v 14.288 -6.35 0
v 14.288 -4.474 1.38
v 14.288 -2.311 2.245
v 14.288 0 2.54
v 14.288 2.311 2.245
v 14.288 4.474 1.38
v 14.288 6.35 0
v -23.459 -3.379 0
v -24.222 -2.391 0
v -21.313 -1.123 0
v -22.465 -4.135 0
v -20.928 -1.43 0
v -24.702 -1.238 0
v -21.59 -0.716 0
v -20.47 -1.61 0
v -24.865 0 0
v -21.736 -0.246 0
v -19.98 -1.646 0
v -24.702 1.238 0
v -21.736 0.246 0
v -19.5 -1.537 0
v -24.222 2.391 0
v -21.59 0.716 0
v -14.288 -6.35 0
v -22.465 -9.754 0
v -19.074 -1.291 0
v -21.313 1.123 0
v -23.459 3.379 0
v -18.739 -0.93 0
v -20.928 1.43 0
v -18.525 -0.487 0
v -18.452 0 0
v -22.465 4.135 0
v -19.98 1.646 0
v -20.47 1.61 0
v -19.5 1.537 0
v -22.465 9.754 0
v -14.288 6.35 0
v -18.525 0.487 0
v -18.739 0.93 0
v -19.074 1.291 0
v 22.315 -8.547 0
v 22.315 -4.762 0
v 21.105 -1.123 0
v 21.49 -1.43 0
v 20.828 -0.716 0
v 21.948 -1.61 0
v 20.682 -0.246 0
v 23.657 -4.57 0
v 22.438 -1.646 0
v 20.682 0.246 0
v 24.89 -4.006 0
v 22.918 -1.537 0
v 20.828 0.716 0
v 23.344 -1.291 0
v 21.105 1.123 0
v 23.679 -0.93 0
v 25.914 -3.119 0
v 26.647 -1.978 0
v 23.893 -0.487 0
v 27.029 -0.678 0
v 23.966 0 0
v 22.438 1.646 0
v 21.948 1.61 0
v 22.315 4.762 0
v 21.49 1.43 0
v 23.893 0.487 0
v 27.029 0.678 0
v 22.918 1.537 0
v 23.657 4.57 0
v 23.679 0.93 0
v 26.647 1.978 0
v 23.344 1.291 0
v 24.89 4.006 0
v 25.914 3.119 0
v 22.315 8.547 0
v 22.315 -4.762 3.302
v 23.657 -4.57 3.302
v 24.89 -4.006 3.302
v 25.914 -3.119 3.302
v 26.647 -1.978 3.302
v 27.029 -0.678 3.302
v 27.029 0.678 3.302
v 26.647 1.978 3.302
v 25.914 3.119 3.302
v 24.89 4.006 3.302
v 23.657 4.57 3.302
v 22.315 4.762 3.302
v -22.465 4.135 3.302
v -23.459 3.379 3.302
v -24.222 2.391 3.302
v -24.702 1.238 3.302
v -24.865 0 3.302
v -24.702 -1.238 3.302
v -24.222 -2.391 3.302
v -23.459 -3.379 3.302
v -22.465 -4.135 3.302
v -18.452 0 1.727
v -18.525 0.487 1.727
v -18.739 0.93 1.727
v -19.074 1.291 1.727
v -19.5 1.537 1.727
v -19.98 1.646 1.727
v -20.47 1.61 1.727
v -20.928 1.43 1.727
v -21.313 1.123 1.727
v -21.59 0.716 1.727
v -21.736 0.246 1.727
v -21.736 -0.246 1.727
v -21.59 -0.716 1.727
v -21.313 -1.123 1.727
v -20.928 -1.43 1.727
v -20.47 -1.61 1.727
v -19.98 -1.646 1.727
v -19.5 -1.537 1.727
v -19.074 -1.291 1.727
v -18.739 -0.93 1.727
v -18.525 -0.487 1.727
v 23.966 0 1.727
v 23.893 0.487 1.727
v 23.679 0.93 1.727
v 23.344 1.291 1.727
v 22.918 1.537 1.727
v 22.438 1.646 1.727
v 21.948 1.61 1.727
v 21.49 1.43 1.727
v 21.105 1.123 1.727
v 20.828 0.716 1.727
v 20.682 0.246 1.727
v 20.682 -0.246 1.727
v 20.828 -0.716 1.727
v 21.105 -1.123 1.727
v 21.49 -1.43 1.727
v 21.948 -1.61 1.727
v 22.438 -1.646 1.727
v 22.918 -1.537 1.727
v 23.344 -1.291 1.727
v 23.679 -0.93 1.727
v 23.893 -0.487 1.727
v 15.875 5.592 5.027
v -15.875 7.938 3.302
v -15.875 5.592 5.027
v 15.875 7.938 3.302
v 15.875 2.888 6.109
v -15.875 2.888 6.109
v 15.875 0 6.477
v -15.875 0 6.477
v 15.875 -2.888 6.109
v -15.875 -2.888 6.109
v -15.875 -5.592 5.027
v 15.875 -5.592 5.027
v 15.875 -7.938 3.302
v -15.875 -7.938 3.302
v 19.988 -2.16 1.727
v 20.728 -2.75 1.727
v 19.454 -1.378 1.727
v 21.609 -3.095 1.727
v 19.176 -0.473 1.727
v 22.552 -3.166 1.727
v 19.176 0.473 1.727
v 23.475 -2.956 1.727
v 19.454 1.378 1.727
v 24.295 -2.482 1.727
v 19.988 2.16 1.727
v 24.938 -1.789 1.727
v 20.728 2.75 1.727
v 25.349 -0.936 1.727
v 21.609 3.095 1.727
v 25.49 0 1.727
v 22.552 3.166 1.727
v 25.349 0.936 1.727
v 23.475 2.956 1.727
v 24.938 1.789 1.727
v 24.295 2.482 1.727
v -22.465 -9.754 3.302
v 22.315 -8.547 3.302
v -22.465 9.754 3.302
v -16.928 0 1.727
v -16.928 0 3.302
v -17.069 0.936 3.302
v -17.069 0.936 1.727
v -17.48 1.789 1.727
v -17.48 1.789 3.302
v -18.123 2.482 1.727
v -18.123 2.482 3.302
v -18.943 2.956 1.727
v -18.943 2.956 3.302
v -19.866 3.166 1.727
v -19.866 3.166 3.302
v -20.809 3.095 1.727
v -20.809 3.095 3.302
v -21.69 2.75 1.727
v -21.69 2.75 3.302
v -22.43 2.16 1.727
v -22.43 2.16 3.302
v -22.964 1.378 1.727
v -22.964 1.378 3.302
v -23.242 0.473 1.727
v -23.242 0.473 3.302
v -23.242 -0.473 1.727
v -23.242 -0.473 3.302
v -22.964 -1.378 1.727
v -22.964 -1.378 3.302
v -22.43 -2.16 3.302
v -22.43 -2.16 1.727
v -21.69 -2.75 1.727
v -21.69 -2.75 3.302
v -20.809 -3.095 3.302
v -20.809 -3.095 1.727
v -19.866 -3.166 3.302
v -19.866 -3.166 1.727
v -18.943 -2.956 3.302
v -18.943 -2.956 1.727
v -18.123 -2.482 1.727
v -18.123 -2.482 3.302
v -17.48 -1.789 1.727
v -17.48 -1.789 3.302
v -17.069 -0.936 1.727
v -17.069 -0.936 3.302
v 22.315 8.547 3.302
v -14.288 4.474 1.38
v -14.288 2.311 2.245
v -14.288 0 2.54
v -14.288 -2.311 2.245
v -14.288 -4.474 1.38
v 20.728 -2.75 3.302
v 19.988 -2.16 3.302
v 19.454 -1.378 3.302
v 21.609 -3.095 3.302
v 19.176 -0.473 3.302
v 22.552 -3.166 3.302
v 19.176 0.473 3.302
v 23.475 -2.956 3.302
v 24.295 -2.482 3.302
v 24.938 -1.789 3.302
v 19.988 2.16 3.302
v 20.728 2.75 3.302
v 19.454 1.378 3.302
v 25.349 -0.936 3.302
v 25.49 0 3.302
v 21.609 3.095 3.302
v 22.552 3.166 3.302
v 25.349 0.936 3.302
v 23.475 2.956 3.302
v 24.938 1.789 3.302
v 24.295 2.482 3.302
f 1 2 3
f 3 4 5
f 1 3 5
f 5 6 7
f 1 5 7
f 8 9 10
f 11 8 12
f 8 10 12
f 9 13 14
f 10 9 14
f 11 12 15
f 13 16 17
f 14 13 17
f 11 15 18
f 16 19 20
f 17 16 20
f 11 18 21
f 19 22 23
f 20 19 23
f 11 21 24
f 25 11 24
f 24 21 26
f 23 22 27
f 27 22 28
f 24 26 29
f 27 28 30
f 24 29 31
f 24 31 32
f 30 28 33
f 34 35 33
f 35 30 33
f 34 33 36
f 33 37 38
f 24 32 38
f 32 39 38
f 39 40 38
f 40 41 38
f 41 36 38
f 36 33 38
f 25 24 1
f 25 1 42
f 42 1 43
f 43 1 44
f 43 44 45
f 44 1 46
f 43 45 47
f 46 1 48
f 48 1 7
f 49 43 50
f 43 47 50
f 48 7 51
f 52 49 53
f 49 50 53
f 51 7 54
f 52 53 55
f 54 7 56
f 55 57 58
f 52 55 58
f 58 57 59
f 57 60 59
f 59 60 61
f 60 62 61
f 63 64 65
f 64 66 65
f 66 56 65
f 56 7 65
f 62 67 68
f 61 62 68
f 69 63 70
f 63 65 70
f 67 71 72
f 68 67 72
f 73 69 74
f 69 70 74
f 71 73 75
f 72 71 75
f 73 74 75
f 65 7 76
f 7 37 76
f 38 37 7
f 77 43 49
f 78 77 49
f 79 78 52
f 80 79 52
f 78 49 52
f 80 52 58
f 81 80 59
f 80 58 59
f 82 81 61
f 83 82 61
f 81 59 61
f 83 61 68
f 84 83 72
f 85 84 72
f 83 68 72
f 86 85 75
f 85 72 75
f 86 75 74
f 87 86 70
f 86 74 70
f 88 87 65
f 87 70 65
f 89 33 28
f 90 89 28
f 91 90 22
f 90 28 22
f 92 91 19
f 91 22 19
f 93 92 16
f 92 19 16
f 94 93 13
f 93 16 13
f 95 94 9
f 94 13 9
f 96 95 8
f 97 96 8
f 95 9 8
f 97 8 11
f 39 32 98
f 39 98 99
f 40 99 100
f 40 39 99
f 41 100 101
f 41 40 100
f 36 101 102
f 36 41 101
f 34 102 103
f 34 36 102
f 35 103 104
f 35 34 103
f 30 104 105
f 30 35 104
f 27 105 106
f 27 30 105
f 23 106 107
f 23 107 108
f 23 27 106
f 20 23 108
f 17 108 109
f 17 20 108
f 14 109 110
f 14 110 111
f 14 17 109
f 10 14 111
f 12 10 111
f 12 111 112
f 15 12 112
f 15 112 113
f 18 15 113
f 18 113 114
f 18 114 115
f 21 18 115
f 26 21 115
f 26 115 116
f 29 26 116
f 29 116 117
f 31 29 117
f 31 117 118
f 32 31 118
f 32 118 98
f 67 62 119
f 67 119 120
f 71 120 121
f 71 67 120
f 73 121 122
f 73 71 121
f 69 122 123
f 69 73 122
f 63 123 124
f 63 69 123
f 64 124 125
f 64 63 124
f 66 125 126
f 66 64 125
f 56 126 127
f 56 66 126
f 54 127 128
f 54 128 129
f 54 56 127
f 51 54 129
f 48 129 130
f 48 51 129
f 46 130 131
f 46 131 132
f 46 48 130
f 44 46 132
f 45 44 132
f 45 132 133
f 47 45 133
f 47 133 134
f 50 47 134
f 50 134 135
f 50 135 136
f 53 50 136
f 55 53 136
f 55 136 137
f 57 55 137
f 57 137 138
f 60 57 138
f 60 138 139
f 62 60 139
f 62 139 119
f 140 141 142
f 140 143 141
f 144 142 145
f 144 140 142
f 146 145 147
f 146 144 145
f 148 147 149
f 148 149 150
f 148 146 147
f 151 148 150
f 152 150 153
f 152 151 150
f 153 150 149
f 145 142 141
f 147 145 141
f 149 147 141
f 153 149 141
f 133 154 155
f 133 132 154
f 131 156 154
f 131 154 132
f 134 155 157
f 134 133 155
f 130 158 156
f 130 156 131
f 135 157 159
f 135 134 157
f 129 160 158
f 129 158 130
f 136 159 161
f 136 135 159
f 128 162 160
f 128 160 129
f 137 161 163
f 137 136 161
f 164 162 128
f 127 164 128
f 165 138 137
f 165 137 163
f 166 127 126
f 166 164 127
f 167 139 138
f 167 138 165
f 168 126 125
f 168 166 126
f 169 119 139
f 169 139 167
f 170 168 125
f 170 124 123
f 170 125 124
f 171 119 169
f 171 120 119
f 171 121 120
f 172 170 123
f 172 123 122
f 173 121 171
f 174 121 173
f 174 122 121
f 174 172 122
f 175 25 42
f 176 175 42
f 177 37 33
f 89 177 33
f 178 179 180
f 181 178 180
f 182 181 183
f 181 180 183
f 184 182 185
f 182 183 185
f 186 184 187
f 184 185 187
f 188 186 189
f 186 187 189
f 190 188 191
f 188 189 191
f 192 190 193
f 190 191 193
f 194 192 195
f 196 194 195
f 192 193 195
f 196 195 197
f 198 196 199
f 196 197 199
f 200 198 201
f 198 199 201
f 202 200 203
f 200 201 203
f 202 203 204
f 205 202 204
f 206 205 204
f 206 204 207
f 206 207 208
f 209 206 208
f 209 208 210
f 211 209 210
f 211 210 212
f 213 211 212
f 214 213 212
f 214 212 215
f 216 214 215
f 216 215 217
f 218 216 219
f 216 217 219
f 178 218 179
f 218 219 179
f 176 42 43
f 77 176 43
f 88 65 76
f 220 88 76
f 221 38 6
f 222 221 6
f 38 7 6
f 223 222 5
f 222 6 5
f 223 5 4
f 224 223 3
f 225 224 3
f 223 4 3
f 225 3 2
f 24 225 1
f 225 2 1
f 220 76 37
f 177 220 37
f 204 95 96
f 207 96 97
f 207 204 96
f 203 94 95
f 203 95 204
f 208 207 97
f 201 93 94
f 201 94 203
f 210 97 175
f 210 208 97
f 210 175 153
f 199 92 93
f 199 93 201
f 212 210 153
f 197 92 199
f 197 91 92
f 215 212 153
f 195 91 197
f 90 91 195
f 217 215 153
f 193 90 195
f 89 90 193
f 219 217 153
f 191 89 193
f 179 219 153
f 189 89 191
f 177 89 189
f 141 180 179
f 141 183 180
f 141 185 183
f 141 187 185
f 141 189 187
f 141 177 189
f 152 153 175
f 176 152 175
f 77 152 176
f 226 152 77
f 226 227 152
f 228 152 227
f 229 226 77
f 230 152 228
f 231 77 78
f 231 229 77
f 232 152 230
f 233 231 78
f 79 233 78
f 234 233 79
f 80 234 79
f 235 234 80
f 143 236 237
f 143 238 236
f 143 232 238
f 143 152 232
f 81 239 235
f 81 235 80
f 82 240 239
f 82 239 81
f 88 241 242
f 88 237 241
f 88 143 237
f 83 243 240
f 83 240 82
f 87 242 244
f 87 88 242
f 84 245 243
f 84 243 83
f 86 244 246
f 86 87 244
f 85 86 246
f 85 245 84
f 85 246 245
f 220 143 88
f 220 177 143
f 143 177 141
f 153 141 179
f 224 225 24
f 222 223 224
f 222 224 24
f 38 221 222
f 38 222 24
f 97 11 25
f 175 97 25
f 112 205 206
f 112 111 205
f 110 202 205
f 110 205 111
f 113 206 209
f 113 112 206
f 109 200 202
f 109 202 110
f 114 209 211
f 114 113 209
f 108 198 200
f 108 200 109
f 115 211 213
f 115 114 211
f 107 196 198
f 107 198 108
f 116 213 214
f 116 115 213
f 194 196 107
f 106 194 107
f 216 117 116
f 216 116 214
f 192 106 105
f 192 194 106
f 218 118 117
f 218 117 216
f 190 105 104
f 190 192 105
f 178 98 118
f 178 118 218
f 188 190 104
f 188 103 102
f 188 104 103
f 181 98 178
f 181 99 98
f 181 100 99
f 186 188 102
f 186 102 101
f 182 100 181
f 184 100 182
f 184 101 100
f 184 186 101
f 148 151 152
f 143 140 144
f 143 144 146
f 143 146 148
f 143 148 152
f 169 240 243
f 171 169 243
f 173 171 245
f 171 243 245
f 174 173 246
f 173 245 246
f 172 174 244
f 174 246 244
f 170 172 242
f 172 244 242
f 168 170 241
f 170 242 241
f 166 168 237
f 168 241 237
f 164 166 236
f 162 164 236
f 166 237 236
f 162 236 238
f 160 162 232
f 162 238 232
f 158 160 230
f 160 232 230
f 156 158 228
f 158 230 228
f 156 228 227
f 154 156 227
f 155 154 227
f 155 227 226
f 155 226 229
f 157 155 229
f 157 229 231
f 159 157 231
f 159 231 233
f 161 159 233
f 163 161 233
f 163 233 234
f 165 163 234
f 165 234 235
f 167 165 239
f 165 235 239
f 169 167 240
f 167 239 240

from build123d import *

# Parameters (mm, degrees)
F0_R     = 1.651
F1_DEPTH = 3.302
F2_R     = 3.175
F2_R_2   = 1.651
F3_DEPTH = 1.5748
F5_DEPTH = 15.875
F7_DEPTH = 14.2875


with BuildPart() as f1:
    # F0 (on Top) → F1 (new body)
    with BuildSketch(Plane.XY):
        with BuildLine():
            ThreePointArc((22.315054, -4.7625), (27.077554, 0), (22.315054, 4.7625))
            Line((22.315054, 4.7625), (22.315054, 8.5471))
            Line((22.315054, 8.5471), (-22.465146, 9.7536))
            Line((-22.465146, 9.7536), (-22.465146, 4.135386))
            ThreePointArc((-22.465146, 4.135386), (-24.865446, 0), (-22.465146, -4.135386))
            Line((-22.465146, -4.135386), (-22.465146, -9.7536))
            Line((-22.465146, -9.7536), (22.315054, -8.5471))
            Line((22.315054, -8.5471), (22.315054, -4.7625))
        make_face()
        with Locations((-20.102946, 0)):
            Circle(F0_R, mode=Mode.SUBTRACT)
        with Locations((22.315054, 0)):
            Circle(F0_R, mode=Mode.SUBTRACT)
    extrude(amount=F1_DEPTH)

    # F2 (on face) → F3 (cut)
    with BuildSketch(Plane.XY.offset(3.302)):
        with Locations((-20.102946, 0)):
            Circle(F2_R)
        with Locations((-20.102946, 0)):
            Circle(F2_R_2, mode=Mode.SUBTRACT)
        with Locations((22.315054, 0)):
            Circle(F2_R)
        with Locations((22.315054, 0)):
            Circle(F2_R_2, mode=Mode.SUBTRACT)
    extrude(amount=-F3_DEPTH, mode=Mode.SUBTRACT)

    # F4 (on Right) → F5 (join, symmetric)
    with BuildSketch(Plane.YZ):
        with BuildLine():
            ThreePointArc((7.9375, 3.302), (0, 6.477), (-7.9375, 3.302))
            Line((-7.9375, 3.302), (7.9375, 3.302))
        make_face()
    extrude(amount=F5_DEPTH, both=True)

    # F6 (on Right) → F7 (cut, symmetric)
    with BuildSketch(Plane.YZ):
        with BuildLine():
            ThreePointArc((6.35, 0), (0, 2.54), (-6.35, 0))
            Line((-6.35, 0), (6.35, 0))
        make_face()
    extrude(amount=F7_DEPTH, both=True, mode=Mode.SUBTRACT)


solid = f1.part
